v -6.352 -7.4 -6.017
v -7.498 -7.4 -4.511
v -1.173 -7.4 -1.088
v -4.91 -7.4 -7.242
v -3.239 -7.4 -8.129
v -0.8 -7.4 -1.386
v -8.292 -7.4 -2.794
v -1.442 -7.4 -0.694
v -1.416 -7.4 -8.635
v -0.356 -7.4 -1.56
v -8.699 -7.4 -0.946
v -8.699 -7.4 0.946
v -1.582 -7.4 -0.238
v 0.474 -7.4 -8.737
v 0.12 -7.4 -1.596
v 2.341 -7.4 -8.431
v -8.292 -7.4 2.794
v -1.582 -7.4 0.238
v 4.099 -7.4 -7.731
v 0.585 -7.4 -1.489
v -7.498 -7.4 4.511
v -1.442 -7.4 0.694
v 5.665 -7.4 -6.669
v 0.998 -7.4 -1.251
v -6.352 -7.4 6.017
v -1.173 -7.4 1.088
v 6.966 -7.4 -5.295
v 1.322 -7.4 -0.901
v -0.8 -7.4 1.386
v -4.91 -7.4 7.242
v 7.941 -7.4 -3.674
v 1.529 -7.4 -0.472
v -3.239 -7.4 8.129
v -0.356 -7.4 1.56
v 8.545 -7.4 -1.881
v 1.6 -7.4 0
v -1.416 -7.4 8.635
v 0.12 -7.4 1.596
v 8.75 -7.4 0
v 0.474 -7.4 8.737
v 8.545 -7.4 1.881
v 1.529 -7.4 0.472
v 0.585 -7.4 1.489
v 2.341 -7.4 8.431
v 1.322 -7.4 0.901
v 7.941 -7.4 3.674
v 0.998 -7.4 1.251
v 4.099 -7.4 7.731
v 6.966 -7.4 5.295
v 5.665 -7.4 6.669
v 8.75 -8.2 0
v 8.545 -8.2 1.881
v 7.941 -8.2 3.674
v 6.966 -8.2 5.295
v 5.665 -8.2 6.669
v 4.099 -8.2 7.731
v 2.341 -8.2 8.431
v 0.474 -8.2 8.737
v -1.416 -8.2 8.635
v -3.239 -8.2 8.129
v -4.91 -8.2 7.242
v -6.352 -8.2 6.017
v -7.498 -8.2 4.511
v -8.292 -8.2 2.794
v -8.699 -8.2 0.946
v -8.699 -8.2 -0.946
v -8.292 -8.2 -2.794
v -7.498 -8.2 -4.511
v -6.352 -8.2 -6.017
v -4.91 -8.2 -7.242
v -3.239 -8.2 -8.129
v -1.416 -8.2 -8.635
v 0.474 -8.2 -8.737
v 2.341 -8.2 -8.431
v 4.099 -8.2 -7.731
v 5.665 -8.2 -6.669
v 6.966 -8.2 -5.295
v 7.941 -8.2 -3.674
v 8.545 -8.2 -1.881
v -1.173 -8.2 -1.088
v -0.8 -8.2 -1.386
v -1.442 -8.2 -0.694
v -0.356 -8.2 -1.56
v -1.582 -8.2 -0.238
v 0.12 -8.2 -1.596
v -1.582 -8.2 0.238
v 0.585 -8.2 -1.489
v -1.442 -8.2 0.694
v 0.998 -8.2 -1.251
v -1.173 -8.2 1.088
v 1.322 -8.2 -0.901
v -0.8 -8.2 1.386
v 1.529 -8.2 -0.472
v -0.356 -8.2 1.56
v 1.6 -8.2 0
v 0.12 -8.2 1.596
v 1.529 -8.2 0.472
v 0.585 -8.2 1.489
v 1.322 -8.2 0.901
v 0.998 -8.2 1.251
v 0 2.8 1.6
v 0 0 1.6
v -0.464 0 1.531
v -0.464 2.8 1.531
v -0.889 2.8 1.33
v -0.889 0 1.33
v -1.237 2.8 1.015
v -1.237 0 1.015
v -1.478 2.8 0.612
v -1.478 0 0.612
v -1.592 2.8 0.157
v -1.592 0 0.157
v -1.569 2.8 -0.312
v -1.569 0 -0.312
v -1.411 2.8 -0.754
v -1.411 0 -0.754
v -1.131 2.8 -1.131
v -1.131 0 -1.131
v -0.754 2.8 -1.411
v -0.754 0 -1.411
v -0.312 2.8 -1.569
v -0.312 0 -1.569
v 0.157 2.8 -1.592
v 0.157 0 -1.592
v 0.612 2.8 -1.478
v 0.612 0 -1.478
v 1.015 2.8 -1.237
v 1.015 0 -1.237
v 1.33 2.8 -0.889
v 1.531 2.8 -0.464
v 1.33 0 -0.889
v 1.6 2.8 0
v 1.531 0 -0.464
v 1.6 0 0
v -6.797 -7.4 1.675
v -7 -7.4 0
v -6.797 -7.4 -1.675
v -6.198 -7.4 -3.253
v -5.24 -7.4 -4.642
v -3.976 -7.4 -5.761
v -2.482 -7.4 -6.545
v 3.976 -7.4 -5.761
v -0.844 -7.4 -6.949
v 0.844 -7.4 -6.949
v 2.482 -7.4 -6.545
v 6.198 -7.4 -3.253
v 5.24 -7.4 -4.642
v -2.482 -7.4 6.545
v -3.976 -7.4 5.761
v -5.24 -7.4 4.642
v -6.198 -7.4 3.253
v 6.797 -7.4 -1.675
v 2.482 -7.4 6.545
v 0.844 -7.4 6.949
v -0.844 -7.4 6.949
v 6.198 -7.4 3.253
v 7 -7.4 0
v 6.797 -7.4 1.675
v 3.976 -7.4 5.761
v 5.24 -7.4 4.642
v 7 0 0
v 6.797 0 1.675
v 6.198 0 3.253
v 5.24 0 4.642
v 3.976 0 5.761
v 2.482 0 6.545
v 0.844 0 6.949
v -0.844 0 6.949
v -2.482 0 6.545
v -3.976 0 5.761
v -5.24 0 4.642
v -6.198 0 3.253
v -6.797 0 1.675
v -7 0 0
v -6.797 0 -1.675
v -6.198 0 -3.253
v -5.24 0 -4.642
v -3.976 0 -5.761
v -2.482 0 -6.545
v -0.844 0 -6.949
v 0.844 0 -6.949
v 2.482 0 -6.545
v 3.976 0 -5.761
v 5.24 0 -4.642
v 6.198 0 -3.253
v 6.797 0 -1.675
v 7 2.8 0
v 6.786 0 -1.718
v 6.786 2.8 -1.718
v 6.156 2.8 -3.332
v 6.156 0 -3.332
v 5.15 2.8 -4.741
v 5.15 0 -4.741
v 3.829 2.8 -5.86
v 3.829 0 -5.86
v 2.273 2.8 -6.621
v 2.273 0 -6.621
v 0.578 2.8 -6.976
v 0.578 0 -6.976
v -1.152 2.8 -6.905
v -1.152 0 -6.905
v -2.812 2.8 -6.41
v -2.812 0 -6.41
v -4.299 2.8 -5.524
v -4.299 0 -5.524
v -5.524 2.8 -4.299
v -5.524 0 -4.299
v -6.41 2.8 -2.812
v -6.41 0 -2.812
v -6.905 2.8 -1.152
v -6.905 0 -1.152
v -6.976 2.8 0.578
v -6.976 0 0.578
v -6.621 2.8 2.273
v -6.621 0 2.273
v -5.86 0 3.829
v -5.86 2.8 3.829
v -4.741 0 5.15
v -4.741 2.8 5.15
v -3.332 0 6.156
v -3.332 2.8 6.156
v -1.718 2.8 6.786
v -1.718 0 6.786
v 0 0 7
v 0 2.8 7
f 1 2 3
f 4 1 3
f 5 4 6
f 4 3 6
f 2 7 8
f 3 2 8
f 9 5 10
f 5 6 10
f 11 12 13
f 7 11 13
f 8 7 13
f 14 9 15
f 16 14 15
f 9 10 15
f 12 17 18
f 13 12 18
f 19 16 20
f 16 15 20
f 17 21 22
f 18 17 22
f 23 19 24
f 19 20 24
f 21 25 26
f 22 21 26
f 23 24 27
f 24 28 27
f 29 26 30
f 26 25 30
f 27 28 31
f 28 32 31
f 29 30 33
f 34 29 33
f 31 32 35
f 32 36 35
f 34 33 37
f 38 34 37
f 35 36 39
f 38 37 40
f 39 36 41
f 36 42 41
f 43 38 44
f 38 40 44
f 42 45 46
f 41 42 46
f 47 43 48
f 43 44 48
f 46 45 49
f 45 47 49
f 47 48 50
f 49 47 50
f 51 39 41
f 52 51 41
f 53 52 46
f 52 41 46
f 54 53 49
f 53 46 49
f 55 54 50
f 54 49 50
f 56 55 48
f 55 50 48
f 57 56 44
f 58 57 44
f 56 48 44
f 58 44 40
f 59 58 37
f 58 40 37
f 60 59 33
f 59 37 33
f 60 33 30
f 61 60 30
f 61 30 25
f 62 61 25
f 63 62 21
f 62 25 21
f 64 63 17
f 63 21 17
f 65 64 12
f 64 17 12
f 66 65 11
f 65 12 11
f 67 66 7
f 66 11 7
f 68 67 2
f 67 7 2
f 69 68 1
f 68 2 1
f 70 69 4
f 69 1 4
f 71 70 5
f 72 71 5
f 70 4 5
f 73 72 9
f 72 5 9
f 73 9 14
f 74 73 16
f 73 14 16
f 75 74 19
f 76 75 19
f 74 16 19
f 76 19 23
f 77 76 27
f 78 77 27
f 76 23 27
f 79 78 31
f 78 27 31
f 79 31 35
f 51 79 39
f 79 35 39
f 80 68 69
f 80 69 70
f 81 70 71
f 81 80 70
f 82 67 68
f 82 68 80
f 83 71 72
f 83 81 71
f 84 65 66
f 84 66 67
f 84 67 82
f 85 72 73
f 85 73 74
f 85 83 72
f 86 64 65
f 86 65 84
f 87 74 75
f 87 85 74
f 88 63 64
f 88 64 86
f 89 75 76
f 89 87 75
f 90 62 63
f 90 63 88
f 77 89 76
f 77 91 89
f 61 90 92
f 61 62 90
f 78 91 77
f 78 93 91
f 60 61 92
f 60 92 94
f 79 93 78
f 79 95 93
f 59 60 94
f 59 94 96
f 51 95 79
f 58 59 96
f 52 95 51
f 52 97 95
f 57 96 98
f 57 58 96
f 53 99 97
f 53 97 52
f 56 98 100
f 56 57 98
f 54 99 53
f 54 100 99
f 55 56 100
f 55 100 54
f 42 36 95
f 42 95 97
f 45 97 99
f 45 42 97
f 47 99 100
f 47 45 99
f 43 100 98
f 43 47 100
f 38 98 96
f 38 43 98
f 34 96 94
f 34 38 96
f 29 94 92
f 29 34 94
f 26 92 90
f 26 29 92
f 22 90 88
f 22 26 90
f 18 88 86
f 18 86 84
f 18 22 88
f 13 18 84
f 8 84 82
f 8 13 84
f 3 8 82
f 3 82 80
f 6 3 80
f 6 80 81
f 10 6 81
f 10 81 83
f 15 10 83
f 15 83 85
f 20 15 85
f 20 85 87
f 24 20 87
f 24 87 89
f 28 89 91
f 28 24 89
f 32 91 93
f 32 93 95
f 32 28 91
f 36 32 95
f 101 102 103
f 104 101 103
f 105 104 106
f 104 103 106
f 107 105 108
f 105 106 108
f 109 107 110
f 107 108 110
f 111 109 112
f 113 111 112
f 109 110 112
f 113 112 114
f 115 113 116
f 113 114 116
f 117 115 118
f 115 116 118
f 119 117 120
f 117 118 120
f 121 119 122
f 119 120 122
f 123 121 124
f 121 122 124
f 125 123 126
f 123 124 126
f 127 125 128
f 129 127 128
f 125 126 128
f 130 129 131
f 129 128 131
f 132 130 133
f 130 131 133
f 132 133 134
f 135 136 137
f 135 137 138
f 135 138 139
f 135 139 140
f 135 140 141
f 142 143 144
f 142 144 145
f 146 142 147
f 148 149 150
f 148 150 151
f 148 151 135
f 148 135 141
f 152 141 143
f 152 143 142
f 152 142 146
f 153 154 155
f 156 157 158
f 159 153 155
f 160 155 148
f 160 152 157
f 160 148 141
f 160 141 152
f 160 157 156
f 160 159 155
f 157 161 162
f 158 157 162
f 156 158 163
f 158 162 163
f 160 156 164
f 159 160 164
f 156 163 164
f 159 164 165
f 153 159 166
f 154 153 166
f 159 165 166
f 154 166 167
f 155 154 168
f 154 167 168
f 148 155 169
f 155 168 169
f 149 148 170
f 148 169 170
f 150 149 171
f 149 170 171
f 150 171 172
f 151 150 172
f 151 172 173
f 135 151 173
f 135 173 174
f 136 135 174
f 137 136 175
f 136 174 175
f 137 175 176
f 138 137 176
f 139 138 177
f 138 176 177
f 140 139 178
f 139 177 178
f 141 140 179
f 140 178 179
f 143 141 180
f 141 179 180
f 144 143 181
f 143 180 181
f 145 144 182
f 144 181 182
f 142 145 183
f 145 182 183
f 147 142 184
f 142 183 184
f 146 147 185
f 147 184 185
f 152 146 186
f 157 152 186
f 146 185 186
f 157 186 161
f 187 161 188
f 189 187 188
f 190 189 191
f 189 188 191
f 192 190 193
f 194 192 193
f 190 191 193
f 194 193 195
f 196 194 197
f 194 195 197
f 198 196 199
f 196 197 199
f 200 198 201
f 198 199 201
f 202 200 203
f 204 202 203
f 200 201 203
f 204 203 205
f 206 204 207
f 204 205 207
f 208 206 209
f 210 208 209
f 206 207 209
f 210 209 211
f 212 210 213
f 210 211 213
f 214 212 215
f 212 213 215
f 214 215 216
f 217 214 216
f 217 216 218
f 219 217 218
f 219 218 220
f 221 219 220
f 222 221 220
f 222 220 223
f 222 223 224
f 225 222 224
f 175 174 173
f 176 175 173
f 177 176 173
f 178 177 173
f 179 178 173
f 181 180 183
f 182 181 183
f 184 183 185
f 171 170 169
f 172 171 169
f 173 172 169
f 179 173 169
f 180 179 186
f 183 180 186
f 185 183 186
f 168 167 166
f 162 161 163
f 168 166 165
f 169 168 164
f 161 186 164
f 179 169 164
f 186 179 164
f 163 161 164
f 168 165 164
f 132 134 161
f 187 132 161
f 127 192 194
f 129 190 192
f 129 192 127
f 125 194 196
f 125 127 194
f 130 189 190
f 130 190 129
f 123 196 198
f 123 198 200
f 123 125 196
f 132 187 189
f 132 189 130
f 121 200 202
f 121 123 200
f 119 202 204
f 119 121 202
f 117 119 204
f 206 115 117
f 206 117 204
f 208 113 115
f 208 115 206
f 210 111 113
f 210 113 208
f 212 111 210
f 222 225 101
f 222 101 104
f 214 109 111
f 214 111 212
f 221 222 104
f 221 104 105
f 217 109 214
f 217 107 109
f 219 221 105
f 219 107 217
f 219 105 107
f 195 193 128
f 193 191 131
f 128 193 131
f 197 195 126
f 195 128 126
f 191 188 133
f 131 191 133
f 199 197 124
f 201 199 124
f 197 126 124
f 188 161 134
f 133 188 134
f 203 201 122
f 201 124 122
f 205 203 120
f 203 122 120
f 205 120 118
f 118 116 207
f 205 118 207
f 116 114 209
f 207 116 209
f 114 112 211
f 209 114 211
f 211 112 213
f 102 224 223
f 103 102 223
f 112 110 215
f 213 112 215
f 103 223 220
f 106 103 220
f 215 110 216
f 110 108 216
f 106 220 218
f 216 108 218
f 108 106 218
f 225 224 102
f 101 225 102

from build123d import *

# Parameters (mm, degrees)
F0_R     = 7
F1_DEPTH = 7.4
F2_R     = 8.75
F2_R_2   = 7
F2_R_3   = 1.6
F3_DEPTH = 0.8
F5_DEPTH = 2.8


with BuildPart() as f1:
    # F0 (on Front) → F1 (new body)
    with BuildSketch(Plane.XZ):
        Circle(F0_R)
    extrude(amount=F1_DEPTH)


with BuildPart() as f3:
    # F2 (on face) → F3 (new body)
    with BuildSketch(Plane.XZ.offset(7.4)):
        Circle(F2_R)
        Circle(F2_R_2, mode=Mode.SUBTRACT)
        Circle(F2_R_2)
        Circle(F2_R_3, mode=Mode.SUBTRACT)
    extrude(amount=F3_DEPTH)


with BuildPart() as f5:
    # F4 (on face) → F5 (new body)
    with BuildSketch(Plane(origin=(0, 0, 0), x_dir=(-1, 0, 0), z_dir=(0, 1, 0))):
        with BuildLine():
            ThreePointArc((-7, 0), (4.9497474683, -4.9497474683), (0, 7))
            Line((0, 7), (0, 1.6))
            ThreePointArc((0, 1.6), (1.1313708499, -1.1313708499), (-1.6, 0))
            Line((-1.6, 0), (-7, 0))
        make_face()
    extrude(amount=F5_DEPTH)


solid = Compound([f1.part, f3.part, f5.part])
